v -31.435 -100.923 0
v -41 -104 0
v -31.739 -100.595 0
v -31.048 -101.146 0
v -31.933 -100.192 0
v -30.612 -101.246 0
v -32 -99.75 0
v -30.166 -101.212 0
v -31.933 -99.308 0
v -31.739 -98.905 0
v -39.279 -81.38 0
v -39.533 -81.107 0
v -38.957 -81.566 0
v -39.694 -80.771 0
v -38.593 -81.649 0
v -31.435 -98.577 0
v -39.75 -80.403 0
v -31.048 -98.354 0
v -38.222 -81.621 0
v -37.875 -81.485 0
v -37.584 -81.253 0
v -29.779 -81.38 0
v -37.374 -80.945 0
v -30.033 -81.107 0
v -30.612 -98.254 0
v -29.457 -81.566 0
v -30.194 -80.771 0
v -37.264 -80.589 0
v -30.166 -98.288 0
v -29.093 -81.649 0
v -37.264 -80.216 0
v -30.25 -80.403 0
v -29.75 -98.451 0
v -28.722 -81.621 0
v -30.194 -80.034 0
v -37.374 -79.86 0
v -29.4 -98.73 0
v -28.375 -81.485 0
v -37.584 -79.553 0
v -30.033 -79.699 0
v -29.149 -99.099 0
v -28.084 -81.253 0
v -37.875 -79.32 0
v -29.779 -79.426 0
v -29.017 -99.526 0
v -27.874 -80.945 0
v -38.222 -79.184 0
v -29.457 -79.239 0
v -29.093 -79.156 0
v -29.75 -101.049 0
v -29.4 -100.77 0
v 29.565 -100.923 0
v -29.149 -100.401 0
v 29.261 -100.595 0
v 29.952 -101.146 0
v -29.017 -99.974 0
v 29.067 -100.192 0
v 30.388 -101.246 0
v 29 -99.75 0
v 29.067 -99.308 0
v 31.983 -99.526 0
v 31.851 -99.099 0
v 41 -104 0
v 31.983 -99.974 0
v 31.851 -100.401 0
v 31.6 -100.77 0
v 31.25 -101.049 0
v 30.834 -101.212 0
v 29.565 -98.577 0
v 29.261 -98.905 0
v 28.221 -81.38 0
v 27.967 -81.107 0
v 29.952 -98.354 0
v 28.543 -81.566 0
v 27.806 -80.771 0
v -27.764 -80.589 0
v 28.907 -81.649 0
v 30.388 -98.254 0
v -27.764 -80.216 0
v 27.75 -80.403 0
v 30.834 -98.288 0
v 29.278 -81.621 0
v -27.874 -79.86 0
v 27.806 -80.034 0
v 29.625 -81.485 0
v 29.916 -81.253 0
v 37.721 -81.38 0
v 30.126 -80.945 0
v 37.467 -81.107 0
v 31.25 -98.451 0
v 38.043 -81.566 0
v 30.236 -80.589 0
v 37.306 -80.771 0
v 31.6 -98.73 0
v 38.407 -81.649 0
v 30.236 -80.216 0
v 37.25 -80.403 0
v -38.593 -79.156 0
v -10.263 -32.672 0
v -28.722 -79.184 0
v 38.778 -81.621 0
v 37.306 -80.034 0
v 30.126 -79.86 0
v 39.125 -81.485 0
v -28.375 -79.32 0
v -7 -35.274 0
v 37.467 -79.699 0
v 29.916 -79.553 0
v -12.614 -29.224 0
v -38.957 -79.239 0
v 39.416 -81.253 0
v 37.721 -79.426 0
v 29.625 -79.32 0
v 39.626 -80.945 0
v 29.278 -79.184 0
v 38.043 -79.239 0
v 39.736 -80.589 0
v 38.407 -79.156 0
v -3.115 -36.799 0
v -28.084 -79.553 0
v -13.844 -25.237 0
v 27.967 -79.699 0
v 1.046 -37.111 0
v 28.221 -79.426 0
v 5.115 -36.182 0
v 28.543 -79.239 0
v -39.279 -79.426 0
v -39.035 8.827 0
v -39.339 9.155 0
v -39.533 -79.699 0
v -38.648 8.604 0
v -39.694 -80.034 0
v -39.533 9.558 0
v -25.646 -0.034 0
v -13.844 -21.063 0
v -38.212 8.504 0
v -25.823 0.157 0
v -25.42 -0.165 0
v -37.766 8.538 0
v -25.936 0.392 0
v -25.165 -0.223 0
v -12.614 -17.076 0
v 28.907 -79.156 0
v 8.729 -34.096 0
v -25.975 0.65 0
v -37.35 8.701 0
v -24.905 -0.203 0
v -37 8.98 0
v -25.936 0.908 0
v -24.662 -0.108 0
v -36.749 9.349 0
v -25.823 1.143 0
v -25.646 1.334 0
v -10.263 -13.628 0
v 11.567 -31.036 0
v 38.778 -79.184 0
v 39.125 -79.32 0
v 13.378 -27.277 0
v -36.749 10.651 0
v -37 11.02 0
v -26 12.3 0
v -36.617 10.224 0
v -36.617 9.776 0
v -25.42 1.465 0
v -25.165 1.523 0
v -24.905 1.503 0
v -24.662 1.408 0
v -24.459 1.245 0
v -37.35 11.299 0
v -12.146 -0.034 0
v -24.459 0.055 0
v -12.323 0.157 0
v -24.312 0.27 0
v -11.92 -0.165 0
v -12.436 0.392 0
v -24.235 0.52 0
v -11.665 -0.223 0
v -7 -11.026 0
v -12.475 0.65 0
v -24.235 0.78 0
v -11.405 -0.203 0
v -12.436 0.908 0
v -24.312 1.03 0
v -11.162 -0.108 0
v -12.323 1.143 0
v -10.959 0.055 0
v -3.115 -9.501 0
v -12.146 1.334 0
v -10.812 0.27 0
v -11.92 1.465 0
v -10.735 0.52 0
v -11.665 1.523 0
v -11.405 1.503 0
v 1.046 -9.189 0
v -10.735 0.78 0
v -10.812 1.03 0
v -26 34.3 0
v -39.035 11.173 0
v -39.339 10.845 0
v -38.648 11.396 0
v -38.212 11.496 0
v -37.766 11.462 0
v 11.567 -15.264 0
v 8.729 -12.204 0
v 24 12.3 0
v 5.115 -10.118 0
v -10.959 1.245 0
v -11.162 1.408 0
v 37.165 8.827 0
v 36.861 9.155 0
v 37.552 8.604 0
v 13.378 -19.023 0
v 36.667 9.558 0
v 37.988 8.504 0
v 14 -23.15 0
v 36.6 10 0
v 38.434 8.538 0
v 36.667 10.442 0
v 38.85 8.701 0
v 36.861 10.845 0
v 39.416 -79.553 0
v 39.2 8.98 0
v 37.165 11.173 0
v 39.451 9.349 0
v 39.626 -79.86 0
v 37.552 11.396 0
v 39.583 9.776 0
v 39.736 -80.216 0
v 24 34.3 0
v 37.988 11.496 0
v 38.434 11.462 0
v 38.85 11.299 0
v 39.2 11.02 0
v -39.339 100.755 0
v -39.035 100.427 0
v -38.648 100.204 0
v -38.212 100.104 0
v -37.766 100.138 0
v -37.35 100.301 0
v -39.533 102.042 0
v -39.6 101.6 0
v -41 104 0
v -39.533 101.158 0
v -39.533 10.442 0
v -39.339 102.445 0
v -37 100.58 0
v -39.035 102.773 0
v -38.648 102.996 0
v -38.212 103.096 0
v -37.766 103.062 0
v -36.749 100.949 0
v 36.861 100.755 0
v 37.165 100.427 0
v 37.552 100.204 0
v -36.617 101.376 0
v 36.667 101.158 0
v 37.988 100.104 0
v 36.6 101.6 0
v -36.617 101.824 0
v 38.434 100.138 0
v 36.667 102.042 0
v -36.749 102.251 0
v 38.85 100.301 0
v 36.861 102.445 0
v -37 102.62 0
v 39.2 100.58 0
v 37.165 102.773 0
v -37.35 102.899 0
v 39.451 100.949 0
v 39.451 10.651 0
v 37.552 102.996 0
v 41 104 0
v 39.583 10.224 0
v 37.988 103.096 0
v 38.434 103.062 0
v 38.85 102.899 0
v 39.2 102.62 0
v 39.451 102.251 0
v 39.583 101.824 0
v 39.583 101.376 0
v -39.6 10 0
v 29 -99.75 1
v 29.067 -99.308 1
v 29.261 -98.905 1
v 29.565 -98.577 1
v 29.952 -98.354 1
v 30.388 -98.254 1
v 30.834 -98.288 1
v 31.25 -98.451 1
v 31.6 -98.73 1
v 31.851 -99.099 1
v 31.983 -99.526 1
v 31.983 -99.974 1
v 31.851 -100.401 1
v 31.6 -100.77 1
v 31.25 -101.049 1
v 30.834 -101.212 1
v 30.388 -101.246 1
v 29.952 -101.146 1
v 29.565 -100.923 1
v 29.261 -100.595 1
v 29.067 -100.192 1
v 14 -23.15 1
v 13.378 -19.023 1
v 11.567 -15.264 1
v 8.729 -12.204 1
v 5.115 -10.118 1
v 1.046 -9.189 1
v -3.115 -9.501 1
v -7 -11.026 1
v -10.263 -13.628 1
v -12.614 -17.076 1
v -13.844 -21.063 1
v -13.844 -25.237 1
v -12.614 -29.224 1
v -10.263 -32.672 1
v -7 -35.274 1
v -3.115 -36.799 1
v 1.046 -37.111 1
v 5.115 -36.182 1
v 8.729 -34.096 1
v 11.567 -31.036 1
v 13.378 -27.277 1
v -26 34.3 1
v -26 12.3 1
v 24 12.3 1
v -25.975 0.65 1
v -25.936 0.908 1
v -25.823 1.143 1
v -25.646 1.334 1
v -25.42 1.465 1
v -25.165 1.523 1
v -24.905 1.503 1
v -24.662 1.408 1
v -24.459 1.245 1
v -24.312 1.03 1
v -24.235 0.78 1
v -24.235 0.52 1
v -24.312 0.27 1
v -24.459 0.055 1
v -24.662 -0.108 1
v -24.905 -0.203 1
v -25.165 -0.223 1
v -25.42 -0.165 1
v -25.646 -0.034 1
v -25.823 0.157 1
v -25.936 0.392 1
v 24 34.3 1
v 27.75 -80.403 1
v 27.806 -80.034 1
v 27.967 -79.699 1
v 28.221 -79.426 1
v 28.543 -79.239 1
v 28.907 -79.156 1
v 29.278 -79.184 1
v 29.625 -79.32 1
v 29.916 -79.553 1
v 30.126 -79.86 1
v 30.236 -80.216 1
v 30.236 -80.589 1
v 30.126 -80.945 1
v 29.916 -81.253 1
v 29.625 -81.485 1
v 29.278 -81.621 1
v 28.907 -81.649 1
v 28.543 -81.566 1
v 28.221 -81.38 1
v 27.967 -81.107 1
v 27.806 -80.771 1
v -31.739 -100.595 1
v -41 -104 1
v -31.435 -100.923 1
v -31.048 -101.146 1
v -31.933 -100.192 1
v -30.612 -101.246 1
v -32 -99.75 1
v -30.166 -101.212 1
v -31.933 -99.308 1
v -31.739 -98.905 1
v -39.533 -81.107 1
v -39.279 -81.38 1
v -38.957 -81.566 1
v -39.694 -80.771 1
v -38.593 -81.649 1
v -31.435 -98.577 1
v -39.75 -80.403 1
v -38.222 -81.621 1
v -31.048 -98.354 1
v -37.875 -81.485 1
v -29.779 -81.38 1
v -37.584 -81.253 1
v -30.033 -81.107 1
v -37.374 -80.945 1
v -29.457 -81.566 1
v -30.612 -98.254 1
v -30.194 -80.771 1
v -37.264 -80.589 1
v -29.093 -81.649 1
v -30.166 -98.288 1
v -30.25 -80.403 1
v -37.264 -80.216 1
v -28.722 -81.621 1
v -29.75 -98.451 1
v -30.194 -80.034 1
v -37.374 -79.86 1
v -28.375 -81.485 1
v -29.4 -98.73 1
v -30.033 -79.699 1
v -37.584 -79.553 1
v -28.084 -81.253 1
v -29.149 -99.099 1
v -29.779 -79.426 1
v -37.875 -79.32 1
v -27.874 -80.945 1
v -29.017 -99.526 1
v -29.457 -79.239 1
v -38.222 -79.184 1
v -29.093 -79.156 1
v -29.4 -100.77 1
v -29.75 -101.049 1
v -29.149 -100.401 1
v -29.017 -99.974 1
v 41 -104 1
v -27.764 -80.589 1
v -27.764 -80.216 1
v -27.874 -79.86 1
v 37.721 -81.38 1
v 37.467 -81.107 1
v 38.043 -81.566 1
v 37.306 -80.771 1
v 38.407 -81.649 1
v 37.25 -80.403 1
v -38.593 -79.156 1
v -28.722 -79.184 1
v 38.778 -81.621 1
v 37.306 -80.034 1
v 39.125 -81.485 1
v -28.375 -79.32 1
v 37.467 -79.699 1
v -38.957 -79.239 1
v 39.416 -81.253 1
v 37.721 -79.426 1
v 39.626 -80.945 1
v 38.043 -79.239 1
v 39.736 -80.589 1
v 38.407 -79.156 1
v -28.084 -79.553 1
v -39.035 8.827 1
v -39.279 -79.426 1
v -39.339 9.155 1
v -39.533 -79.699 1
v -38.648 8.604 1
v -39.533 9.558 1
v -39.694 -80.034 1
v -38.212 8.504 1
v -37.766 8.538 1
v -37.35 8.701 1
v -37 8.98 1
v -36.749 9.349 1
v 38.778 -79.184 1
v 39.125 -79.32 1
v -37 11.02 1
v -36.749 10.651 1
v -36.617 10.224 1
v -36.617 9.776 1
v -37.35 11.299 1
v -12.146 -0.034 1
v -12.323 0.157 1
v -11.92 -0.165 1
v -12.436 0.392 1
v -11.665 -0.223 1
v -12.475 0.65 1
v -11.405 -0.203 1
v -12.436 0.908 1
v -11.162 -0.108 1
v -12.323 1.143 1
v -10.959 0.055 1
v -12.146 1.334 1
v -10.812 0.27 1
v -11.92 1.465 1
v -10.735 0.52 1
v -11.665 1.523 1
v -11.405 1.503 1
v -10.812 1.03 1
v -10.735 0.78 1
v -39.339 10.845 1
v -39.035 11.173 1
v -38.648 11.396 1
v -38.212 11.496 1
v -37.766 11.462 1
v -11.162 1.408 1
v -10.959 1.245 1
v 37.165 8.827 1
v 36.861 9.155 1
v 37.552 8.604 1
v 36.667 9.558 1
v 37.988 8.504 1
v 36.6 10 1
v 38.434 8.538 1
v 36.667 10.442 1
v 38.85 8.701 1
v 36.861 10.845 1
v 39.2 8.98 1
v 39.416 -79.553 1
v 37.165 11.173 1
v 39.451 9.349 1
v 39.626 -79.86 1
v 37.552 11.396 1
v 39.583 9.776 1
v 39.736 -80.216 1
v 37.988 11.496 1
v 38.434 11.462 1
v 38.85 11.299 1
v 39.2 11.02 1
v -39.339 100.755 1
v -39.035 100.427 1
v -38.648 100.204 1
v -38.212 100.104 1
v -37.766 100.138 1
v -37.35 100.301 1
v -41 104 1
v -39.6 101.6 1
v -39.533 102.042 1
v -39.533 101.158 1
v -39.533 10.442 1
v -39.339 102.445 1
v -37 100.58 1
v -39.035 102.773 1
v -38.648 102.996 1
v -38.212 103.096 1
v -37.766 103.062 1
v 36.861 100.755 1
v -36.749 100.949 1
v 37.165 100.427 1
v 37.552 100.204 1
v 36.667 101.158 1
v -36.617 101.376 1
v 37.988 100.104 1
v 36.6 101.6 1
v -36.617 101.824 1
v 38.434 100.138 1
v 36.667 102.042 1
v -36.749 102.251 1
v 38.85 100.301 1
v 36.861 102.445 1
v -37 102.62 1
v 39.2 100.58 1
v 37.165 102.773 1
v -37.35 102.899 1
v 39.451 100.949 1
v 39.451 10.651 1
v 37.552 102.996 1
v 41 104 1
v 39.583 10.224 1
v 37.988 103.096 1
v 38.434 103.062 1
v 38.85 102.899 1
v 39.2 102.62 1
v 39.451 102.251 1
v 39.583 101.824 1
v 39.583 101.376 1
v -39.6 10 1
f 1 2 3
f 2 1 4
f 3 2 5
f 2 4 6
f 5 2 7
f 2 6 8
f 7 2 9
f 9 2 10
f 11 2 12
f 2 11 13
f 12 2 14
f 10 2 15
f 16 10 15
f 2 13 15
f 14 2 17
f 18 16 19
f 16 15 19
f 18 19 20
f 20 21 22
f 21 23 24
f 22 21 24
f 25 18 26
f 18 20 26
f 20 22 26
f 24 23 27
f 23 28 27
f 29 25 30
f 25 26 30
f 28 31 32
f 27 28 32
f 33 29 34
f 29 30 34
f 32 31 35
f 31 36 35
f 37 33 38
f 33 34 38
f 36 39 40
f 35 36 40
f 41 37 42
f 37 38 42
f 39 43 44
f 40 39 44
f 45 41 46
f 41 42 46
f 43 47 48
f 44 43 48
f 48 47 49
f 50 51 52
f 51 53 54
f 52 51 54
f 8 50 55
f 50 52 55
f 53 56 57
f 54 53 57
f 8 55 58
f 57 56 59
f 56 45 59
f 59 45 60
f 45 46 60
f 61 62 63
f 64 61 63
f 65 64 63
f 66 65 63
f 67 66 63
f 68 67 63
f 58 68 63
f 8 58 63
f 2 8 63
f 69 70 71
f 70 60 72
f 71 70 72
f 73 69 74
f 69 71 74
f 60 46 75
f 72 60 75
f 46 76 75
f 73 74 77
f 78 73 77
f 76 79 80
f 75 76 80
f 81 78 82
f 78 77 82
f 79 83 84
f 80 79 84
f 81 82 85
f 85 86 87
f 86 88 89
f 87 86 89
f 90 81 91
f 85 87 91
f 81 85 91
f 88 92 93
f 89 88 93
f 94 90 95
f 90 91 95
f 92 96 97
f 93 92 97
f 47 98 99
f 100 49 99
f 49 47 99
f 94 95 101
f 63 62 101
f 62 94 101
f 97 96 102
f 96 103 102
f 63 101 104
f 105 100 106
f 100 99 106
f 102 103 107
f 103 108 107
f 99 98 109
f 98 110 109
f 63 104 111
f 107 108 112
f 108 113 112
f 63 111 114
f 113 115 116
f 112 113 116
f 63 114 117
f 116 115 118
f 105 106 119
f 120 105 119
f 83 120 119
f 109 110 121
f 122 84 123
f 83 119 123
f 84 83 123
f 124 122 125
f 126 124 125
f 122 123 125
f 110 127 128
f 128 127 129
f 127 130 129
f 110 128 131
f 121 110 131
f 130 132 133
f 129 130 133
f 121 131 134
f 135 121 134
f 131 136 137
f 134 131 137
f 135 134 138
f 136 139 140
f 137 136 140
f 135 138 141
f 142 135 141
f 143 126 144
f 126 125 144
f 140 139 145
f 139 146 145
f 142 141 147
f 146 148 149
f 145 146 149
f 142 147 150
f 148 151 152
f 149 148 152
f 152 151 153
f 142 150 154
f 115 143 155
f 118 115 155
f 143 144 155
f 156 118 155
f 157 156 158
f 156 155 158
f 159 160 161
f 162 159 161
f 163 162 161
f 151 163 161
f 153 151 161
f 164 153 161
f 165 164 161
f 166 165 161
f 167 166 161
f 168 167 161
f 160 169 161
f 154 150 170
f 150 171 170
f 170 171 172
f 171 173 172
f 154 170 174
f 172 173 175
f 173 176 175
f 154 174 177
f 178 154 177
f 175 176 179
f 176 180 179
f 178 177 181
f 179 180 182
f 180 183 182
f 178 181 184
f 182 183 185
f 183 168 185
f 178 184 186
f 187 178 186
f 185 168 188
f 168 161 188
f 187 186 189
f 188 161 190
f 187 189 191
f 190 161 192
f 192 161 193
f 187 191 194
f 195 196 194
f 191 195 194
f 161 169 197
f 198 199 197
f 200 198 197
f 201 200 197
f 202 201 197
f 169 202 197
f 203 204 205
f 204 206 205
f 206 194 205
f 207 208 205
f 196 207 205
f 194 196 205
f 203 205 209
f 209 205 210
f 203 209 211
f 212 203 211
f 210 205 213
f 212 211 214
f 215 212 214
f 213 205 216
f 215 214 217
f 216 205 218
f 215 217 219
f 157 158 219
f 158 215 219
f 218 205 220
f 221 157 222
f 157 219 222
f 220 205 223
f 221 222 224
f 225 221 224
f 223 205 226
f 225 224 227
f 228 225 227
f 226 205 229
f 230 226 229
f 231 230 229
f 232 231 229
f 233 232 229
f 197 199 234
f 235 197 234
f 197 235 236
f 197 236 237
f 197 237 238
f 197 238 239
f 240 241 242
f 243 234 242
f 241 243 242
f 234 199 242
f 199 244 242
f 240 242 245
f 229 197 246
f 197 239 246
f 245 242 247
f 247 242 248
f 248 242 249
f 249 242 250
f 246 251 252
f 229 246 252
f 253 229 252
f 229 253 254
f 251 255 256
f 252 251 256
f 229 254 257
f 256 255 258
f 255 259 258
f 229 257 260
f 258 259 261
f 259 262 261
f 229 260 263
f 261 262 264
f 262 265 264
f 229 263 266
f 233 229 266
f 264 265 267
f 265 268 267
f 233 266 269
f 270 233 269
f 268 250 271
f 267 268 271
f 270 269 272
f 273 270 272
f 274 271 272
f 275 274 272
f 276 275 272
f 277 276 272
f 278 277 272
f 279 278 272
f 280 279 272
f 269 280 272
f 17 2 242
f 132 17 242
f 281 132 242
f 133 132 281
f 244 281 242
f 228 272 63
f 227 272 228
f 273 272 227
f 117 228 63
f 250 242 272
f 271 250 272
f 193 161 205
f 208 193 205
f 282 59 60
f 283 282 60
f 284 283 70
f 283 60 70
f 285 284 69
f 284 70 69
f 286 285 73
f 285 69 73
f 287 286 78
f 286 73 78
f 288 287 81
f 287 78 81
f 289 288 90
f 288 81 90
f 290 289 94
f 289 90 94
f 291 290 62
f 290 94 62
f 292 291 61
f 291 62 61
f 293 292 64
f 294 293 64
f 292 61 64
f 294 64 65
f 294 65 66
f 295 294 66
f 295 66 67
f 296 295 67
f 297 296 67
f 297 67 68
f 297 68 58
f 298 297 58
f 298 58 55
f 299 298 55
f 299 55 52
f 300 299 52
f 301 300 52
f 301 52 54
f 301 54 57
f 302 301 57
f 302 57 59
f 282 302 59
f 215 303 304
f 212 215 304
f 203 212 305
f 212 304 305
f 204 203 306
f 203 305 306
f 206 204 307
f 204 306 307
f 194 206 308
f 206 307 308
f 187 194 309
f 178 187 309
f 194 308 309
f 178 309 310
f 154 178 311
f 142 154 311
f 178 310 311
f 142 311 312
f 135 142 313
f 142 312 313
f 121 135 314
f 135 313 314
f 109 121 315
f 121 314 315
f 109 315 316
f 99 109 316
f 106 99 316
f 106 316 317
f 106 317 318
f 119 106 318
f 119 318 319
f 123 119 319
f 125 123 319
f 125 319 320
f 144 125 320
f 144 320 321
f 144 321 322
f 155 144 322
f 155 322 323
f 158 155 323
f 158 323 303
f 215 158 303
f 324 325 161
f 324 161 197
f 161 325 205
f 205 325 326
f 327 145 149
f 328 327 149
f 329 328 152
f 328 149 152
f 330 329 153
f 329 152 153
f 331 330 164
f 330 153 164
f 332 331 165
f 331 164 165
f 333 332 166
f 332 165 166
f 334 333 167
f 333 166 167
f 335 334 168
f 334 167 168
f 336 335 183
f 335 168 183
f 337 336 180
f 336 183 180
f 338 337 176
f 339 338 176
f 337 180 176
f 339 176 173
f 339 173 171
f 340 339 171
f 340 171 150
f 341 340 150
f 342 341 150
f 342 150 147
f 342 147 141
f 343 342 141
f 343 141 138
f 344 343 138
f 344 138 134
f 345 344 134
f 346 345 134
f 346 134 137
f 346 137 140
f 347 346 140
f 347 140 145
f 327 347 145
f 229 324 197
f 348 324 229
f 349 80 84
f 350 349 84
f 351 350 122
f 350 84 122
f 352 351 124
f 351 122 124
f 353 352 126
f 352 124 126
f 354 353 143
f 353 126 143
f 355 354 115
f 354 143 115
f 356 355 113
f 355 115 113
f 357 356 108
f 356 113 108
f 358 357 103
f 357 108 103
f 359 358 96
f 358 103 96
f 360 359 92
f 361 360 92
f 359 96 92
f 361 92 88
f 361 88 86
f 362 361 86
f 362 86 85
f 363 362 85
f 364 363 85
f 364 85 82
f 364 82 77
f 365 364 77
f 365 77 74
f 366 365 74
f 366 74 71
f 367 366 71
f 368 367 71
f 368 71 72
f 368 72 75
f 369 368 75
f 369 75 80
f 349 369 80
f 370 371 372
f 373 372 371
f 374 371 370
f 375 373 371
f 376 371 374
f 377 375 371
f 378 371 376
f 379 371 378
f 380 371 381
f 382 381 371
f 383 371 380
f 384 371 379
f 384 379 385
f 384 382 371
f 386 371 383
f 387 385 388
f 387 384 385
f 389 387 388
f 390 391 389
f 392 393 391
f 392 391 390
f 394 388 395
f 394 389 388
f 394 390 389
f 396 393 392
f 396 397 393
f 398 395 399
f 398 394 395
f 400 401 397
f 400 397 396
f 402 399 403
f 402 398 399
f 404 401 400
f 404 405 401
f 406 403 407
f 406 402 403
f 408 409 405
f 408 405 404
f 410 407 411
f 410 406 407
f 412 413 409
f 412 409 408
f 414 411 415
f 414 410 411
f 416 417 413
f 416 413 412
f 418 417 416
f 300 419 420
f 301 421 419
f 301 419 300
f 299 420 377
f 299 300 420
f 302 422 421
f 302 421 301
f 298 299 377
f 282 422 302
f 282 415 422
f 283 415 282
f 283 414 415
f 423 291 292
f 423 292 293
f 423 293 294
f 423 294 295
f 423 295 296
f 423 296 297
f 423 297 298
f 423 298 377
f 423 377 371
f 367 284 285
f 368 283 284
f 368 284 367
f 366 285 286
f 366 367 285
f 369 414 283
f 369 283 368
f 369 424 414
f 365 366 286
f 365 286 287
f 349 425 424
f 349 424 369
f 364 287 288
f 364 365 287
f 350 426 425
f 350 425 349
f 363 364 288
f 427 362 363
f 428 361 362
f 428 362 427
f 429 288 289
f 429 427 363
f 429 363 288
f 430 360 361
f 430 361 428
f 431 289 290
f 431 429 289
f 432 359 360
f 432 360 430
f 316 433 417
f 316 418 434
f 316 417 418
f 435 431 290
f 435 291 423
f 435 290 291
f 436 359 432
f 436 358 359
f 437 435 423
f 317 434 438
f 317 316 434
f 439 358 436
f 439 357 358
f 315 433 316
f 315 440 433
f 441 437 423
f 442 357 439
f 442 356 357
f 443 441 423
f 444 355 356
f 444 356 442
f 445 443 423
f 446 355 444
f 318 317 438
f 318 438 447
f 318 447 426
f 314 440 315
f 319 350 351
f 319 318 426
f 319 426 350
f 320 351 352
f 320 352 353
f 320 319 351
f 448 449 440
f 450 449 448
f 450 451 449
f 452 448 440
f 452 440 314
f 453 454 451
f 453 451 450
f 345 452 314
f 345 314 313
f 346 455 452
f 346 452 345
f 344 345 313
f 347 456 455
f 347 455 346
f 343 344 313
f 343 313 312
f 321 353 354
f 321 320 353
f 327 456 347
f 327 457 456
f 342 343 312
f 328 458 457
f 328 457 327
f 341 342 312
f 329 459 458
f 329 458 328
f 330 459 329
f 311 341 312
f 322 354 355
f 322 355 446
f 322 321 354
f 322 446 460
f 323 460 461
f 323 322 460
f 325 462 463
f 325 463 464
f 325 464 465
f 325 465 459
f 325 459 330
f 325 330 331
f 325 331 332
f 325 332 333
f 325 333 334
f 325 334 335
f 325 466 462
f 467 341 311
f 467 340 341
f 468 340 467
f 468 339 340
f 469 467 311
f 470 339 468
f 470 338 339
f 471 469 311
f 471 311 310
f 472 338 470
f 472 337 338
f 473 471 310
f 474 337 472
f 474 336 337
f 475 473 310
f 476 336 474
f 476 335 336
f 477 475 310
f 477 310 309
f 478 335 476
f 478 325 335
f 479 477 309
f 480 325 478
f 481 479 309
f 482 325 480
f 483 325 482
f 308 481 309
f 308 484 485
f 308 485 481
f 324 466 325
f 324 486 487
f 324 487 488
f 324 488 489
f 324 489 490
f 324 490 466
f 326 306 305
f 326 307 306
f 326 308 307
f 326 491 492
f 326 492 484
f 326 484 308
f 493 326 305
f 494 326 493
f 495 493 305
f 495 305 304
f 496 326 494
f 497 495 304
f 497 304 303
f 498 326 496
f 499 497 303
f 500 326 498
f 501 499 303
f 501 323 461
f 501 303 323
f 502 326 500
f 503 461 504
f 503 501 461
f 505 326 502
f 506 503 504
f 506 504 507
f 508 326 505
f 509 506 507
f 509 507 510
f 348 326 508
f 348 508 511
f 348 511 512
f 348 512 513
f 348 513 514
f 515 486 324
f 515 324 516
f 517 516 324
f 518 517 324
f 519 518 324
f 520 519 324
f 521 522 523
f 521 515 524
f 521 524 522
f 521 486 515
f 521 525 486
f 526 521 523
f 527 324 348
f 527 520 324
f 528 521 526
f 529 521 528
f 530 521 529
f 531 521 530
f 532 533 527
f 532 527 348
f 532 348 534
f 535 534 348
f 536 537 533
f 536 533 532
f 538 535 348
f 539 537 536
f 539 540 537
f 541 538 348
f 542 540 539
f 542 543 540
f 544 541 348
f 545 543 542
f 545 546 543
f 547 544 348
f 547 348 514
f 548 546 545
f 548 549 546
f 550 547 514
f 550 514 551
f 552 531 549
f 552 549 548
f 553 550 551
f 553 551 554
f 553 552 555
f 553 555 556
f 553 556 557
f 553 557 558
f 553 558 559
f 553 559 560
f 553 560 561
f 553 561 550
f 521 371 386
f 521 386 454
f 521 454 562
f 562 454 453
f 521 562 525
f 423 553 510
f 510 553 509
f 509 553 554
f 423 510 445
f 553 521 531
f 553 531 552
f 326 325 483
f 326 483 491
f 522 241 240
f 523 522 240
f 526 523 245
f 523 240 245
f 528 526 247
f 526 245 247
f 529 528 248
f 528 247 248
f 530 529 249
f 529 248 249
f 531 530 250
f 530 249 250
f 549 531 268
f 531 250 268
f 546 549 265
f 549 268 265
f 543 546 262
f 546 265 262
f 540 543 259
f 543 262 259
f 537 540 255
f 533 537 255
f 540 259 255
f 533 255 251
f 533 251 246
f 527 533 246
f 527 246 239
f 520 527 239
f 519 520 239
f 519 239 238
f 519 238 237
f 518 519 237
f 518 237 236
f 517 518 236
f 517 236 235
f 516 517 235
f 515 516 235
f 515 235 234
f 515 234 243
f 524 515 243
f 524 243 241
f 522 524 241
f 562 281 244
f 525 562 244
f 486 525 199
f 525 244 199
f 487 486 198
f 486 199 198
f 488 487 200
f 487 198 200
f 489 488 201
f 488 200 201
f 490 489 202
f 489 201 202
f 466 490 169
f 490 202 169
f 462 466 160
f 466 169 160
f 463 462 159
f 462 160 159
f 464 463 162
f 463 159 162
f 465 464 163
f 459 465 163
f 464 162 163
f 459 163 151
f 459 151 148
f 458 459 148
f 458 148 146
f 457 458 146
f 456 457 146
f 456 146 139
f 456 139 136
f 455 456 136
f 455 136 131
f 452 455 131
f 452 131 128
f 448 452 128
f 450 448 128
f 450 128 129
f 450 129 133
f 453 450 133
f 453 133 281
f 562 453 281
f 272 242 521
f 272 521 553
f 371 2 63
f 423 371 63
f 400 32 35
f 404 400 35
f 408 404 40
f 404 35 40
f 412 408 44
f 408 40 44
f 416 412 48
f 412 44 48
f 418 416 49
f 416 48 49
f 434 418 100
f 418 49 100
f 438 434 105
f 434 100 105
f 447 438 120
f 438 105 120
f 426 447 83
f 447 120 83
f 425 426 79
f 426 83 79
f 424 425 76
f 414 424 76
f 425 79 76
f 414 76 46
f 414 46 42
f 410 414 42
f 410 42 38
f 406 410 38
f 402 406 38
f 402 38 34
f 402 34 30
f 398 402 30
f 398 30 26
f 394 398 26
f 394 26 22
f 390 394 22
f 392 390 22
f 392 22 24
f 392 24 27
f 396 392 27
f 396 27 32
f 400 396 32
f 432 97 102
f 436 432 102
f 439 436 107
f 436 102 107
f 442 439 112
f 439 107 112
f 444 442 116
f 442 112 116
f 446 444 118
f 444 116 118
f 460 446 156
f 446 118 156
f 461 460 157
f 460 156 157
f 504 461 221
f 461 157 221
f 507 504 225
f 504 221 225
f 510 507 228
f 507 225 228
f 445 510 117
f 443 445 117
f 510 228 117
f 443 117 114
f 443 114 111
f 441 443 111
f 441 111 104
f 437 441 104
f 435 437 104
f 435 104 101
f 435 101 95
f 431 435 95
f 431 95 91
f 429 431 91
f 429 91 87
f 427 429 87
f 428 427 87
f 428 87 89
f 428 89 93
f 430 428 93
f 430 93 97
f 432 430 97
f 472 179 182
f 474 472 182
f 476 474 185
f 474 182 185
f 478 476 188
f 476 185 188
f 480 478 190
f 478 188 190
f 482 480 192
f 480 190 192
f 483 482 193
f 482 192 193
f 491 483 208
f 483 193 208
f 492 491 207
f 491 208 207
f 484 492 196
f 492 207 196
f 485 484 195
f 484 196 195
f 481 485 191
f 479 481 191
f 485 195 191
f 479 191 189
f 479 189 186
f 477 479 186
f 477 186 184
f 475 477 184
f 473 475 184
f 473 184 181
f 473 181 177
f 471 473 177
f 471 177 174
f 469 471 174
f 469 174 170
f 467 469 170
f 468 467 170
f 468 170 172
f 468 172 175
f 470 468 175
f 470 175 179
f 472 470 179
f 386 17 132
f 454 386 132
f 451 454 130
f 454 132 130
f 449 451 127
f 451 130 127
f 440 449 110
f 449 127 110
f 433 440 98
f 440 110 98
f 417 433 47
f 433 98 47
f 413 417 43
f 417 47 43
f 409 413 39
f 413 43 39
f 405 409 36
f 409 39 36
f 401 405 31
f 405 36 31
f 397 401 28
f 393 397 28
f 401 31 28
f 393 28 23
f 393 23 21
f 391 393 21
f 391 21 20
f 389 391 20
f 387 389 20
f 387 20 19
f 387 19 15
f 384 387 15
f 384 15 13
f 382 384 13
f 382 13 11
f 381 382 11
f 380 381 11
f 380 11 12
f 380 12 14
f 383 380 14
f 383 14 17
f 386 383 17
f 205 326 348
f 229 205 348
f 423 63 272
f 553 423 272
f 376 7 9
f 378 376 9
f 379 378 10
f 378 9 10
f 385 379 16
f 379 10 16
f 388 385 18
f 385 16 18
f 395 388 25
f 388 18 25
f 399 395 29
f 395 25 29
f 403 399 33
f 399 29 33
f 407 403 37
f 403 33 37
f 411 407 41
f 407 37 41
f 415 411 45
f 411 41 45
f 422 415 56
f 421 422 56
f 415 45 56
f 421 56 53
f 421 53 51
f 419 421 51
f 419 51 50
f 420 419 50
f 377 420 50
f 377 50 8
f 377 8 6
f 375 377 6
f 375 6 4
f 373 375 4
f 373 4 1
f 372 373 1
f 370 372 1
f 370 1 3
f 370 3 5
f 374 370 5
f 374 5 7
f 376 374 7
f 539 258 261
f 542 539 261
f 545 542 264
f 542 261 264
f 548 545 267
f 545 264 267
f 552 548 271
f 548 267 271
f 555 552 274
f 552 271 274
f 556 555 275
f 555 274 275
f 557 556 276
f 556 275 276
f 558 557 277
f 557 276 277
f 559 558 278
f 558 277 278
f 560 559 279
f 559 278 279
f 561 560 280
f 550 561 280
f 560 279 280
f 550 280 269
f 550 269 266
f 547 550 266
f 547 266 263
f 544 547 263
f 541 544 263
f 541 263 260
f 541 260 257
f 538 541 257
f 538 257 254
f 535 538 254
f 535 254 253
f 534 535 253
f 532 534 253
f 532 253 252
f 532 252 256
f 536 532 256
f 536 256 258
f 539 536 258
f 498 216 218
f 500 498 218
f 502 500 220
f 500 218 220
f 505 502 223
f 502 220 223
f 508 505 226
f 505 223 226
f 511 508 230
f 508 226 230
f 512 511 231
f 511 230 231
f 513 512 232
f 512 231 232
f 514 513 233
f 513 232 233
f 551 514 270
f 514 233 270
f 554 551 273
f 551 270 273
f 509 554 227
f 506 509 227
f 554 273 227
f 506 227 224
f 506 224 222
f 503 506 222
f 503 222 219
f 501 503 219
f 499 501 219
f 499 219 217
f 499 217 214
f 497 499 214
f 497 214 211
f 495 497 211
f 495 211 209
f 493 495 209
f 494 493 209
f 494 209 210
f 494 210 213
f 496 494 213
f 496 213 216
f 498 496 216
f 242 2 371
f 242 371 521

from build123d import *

# Parameters (mm, degrees)
SKETCH1_W                    = 82
SKETCH1_H                    = 208
BOSS_EXTRUDE1_DEPTH          = 1
F_3_0_3_DIAMETER_HOLE1_D     = 3
SKETCH8_R                    = 14
CUT_EXTRUDE1_DEPTH           = 10
SKETCH11_W                   = 50
SKETCH11_H                   = 22
CUT_EXTRUDE2_DEPTH           = 10
F_2_5_2_5_DIAMETER_HOLE1_D   = 2.5
F_1_75_1_75_DIAMETER_HOLE1_D = 1.75


with BuildPart() as part:
    # Sketch1 → Boss-Extrude1 (new body)
    with BuildSketch(Plane.XY):
        Rectangle(SKETCH1_W, SKETCH1_H)
    extrude(amount=BOSS_EXTRUDE1_DEPTH)

    # Ø3.0 (3) Diameter Hole1 (through all)
    with Locations(Plane.XY.offset(1)):
        with Locations((-38.1, 10), (38.1, 10), (30.5, -99.75), (-30.5, -99.75), (-38.1, 101.59999968), (38.1, 101.59999968)):
            Hole(F_3_0_3_DIAMETER_HOLE1_D / 2)

    # Sketch8 → Cut-Extrude1 (cut)
    with BuildSketch(Plane.XY.offset(1)):
        with Locations((0, -23.15)):
            Circle(SKETCH8_R)
    extrude(amount=-CUT_EXTRUDE1_DEPTH, mode=Mode.SUBTRACT)

    # Sketch11 → Cut-Extrude2 (cut)
    with BuildSketch(Plane.XY.offset(1)):
        with Locations((-1, 23.3)):
            Rectangle(SKETCH11_W, SKETCH11_H)
    extrude(amount=-CUT_EXTRUDE2_DEPTH, mode=Mode.SUBTRACT)

    # Ø2.5 (2.5) Diameter Hole1 (through all)
    with Locations(Plane.XY.offset(1)):
        with Locations((-38.5, -80.402796493), (-29, -80.402796493), (29, -80.402796493), (38.5, -80.402796493)):
            Hole(F_2_5_2_5_DIAMETER_HOLE1_D / 2)

    # Ø1.75 (1.75) Diameter Hole1 (through all)
    with Locations(Plane.XY.offset(1)):
        with Locations((-25.1, 0.65), (-11.6, 0.65)):
            Hole(F_1_75_1_75_DIAMETER_HOLE1_D / 2)


solid = part.part
